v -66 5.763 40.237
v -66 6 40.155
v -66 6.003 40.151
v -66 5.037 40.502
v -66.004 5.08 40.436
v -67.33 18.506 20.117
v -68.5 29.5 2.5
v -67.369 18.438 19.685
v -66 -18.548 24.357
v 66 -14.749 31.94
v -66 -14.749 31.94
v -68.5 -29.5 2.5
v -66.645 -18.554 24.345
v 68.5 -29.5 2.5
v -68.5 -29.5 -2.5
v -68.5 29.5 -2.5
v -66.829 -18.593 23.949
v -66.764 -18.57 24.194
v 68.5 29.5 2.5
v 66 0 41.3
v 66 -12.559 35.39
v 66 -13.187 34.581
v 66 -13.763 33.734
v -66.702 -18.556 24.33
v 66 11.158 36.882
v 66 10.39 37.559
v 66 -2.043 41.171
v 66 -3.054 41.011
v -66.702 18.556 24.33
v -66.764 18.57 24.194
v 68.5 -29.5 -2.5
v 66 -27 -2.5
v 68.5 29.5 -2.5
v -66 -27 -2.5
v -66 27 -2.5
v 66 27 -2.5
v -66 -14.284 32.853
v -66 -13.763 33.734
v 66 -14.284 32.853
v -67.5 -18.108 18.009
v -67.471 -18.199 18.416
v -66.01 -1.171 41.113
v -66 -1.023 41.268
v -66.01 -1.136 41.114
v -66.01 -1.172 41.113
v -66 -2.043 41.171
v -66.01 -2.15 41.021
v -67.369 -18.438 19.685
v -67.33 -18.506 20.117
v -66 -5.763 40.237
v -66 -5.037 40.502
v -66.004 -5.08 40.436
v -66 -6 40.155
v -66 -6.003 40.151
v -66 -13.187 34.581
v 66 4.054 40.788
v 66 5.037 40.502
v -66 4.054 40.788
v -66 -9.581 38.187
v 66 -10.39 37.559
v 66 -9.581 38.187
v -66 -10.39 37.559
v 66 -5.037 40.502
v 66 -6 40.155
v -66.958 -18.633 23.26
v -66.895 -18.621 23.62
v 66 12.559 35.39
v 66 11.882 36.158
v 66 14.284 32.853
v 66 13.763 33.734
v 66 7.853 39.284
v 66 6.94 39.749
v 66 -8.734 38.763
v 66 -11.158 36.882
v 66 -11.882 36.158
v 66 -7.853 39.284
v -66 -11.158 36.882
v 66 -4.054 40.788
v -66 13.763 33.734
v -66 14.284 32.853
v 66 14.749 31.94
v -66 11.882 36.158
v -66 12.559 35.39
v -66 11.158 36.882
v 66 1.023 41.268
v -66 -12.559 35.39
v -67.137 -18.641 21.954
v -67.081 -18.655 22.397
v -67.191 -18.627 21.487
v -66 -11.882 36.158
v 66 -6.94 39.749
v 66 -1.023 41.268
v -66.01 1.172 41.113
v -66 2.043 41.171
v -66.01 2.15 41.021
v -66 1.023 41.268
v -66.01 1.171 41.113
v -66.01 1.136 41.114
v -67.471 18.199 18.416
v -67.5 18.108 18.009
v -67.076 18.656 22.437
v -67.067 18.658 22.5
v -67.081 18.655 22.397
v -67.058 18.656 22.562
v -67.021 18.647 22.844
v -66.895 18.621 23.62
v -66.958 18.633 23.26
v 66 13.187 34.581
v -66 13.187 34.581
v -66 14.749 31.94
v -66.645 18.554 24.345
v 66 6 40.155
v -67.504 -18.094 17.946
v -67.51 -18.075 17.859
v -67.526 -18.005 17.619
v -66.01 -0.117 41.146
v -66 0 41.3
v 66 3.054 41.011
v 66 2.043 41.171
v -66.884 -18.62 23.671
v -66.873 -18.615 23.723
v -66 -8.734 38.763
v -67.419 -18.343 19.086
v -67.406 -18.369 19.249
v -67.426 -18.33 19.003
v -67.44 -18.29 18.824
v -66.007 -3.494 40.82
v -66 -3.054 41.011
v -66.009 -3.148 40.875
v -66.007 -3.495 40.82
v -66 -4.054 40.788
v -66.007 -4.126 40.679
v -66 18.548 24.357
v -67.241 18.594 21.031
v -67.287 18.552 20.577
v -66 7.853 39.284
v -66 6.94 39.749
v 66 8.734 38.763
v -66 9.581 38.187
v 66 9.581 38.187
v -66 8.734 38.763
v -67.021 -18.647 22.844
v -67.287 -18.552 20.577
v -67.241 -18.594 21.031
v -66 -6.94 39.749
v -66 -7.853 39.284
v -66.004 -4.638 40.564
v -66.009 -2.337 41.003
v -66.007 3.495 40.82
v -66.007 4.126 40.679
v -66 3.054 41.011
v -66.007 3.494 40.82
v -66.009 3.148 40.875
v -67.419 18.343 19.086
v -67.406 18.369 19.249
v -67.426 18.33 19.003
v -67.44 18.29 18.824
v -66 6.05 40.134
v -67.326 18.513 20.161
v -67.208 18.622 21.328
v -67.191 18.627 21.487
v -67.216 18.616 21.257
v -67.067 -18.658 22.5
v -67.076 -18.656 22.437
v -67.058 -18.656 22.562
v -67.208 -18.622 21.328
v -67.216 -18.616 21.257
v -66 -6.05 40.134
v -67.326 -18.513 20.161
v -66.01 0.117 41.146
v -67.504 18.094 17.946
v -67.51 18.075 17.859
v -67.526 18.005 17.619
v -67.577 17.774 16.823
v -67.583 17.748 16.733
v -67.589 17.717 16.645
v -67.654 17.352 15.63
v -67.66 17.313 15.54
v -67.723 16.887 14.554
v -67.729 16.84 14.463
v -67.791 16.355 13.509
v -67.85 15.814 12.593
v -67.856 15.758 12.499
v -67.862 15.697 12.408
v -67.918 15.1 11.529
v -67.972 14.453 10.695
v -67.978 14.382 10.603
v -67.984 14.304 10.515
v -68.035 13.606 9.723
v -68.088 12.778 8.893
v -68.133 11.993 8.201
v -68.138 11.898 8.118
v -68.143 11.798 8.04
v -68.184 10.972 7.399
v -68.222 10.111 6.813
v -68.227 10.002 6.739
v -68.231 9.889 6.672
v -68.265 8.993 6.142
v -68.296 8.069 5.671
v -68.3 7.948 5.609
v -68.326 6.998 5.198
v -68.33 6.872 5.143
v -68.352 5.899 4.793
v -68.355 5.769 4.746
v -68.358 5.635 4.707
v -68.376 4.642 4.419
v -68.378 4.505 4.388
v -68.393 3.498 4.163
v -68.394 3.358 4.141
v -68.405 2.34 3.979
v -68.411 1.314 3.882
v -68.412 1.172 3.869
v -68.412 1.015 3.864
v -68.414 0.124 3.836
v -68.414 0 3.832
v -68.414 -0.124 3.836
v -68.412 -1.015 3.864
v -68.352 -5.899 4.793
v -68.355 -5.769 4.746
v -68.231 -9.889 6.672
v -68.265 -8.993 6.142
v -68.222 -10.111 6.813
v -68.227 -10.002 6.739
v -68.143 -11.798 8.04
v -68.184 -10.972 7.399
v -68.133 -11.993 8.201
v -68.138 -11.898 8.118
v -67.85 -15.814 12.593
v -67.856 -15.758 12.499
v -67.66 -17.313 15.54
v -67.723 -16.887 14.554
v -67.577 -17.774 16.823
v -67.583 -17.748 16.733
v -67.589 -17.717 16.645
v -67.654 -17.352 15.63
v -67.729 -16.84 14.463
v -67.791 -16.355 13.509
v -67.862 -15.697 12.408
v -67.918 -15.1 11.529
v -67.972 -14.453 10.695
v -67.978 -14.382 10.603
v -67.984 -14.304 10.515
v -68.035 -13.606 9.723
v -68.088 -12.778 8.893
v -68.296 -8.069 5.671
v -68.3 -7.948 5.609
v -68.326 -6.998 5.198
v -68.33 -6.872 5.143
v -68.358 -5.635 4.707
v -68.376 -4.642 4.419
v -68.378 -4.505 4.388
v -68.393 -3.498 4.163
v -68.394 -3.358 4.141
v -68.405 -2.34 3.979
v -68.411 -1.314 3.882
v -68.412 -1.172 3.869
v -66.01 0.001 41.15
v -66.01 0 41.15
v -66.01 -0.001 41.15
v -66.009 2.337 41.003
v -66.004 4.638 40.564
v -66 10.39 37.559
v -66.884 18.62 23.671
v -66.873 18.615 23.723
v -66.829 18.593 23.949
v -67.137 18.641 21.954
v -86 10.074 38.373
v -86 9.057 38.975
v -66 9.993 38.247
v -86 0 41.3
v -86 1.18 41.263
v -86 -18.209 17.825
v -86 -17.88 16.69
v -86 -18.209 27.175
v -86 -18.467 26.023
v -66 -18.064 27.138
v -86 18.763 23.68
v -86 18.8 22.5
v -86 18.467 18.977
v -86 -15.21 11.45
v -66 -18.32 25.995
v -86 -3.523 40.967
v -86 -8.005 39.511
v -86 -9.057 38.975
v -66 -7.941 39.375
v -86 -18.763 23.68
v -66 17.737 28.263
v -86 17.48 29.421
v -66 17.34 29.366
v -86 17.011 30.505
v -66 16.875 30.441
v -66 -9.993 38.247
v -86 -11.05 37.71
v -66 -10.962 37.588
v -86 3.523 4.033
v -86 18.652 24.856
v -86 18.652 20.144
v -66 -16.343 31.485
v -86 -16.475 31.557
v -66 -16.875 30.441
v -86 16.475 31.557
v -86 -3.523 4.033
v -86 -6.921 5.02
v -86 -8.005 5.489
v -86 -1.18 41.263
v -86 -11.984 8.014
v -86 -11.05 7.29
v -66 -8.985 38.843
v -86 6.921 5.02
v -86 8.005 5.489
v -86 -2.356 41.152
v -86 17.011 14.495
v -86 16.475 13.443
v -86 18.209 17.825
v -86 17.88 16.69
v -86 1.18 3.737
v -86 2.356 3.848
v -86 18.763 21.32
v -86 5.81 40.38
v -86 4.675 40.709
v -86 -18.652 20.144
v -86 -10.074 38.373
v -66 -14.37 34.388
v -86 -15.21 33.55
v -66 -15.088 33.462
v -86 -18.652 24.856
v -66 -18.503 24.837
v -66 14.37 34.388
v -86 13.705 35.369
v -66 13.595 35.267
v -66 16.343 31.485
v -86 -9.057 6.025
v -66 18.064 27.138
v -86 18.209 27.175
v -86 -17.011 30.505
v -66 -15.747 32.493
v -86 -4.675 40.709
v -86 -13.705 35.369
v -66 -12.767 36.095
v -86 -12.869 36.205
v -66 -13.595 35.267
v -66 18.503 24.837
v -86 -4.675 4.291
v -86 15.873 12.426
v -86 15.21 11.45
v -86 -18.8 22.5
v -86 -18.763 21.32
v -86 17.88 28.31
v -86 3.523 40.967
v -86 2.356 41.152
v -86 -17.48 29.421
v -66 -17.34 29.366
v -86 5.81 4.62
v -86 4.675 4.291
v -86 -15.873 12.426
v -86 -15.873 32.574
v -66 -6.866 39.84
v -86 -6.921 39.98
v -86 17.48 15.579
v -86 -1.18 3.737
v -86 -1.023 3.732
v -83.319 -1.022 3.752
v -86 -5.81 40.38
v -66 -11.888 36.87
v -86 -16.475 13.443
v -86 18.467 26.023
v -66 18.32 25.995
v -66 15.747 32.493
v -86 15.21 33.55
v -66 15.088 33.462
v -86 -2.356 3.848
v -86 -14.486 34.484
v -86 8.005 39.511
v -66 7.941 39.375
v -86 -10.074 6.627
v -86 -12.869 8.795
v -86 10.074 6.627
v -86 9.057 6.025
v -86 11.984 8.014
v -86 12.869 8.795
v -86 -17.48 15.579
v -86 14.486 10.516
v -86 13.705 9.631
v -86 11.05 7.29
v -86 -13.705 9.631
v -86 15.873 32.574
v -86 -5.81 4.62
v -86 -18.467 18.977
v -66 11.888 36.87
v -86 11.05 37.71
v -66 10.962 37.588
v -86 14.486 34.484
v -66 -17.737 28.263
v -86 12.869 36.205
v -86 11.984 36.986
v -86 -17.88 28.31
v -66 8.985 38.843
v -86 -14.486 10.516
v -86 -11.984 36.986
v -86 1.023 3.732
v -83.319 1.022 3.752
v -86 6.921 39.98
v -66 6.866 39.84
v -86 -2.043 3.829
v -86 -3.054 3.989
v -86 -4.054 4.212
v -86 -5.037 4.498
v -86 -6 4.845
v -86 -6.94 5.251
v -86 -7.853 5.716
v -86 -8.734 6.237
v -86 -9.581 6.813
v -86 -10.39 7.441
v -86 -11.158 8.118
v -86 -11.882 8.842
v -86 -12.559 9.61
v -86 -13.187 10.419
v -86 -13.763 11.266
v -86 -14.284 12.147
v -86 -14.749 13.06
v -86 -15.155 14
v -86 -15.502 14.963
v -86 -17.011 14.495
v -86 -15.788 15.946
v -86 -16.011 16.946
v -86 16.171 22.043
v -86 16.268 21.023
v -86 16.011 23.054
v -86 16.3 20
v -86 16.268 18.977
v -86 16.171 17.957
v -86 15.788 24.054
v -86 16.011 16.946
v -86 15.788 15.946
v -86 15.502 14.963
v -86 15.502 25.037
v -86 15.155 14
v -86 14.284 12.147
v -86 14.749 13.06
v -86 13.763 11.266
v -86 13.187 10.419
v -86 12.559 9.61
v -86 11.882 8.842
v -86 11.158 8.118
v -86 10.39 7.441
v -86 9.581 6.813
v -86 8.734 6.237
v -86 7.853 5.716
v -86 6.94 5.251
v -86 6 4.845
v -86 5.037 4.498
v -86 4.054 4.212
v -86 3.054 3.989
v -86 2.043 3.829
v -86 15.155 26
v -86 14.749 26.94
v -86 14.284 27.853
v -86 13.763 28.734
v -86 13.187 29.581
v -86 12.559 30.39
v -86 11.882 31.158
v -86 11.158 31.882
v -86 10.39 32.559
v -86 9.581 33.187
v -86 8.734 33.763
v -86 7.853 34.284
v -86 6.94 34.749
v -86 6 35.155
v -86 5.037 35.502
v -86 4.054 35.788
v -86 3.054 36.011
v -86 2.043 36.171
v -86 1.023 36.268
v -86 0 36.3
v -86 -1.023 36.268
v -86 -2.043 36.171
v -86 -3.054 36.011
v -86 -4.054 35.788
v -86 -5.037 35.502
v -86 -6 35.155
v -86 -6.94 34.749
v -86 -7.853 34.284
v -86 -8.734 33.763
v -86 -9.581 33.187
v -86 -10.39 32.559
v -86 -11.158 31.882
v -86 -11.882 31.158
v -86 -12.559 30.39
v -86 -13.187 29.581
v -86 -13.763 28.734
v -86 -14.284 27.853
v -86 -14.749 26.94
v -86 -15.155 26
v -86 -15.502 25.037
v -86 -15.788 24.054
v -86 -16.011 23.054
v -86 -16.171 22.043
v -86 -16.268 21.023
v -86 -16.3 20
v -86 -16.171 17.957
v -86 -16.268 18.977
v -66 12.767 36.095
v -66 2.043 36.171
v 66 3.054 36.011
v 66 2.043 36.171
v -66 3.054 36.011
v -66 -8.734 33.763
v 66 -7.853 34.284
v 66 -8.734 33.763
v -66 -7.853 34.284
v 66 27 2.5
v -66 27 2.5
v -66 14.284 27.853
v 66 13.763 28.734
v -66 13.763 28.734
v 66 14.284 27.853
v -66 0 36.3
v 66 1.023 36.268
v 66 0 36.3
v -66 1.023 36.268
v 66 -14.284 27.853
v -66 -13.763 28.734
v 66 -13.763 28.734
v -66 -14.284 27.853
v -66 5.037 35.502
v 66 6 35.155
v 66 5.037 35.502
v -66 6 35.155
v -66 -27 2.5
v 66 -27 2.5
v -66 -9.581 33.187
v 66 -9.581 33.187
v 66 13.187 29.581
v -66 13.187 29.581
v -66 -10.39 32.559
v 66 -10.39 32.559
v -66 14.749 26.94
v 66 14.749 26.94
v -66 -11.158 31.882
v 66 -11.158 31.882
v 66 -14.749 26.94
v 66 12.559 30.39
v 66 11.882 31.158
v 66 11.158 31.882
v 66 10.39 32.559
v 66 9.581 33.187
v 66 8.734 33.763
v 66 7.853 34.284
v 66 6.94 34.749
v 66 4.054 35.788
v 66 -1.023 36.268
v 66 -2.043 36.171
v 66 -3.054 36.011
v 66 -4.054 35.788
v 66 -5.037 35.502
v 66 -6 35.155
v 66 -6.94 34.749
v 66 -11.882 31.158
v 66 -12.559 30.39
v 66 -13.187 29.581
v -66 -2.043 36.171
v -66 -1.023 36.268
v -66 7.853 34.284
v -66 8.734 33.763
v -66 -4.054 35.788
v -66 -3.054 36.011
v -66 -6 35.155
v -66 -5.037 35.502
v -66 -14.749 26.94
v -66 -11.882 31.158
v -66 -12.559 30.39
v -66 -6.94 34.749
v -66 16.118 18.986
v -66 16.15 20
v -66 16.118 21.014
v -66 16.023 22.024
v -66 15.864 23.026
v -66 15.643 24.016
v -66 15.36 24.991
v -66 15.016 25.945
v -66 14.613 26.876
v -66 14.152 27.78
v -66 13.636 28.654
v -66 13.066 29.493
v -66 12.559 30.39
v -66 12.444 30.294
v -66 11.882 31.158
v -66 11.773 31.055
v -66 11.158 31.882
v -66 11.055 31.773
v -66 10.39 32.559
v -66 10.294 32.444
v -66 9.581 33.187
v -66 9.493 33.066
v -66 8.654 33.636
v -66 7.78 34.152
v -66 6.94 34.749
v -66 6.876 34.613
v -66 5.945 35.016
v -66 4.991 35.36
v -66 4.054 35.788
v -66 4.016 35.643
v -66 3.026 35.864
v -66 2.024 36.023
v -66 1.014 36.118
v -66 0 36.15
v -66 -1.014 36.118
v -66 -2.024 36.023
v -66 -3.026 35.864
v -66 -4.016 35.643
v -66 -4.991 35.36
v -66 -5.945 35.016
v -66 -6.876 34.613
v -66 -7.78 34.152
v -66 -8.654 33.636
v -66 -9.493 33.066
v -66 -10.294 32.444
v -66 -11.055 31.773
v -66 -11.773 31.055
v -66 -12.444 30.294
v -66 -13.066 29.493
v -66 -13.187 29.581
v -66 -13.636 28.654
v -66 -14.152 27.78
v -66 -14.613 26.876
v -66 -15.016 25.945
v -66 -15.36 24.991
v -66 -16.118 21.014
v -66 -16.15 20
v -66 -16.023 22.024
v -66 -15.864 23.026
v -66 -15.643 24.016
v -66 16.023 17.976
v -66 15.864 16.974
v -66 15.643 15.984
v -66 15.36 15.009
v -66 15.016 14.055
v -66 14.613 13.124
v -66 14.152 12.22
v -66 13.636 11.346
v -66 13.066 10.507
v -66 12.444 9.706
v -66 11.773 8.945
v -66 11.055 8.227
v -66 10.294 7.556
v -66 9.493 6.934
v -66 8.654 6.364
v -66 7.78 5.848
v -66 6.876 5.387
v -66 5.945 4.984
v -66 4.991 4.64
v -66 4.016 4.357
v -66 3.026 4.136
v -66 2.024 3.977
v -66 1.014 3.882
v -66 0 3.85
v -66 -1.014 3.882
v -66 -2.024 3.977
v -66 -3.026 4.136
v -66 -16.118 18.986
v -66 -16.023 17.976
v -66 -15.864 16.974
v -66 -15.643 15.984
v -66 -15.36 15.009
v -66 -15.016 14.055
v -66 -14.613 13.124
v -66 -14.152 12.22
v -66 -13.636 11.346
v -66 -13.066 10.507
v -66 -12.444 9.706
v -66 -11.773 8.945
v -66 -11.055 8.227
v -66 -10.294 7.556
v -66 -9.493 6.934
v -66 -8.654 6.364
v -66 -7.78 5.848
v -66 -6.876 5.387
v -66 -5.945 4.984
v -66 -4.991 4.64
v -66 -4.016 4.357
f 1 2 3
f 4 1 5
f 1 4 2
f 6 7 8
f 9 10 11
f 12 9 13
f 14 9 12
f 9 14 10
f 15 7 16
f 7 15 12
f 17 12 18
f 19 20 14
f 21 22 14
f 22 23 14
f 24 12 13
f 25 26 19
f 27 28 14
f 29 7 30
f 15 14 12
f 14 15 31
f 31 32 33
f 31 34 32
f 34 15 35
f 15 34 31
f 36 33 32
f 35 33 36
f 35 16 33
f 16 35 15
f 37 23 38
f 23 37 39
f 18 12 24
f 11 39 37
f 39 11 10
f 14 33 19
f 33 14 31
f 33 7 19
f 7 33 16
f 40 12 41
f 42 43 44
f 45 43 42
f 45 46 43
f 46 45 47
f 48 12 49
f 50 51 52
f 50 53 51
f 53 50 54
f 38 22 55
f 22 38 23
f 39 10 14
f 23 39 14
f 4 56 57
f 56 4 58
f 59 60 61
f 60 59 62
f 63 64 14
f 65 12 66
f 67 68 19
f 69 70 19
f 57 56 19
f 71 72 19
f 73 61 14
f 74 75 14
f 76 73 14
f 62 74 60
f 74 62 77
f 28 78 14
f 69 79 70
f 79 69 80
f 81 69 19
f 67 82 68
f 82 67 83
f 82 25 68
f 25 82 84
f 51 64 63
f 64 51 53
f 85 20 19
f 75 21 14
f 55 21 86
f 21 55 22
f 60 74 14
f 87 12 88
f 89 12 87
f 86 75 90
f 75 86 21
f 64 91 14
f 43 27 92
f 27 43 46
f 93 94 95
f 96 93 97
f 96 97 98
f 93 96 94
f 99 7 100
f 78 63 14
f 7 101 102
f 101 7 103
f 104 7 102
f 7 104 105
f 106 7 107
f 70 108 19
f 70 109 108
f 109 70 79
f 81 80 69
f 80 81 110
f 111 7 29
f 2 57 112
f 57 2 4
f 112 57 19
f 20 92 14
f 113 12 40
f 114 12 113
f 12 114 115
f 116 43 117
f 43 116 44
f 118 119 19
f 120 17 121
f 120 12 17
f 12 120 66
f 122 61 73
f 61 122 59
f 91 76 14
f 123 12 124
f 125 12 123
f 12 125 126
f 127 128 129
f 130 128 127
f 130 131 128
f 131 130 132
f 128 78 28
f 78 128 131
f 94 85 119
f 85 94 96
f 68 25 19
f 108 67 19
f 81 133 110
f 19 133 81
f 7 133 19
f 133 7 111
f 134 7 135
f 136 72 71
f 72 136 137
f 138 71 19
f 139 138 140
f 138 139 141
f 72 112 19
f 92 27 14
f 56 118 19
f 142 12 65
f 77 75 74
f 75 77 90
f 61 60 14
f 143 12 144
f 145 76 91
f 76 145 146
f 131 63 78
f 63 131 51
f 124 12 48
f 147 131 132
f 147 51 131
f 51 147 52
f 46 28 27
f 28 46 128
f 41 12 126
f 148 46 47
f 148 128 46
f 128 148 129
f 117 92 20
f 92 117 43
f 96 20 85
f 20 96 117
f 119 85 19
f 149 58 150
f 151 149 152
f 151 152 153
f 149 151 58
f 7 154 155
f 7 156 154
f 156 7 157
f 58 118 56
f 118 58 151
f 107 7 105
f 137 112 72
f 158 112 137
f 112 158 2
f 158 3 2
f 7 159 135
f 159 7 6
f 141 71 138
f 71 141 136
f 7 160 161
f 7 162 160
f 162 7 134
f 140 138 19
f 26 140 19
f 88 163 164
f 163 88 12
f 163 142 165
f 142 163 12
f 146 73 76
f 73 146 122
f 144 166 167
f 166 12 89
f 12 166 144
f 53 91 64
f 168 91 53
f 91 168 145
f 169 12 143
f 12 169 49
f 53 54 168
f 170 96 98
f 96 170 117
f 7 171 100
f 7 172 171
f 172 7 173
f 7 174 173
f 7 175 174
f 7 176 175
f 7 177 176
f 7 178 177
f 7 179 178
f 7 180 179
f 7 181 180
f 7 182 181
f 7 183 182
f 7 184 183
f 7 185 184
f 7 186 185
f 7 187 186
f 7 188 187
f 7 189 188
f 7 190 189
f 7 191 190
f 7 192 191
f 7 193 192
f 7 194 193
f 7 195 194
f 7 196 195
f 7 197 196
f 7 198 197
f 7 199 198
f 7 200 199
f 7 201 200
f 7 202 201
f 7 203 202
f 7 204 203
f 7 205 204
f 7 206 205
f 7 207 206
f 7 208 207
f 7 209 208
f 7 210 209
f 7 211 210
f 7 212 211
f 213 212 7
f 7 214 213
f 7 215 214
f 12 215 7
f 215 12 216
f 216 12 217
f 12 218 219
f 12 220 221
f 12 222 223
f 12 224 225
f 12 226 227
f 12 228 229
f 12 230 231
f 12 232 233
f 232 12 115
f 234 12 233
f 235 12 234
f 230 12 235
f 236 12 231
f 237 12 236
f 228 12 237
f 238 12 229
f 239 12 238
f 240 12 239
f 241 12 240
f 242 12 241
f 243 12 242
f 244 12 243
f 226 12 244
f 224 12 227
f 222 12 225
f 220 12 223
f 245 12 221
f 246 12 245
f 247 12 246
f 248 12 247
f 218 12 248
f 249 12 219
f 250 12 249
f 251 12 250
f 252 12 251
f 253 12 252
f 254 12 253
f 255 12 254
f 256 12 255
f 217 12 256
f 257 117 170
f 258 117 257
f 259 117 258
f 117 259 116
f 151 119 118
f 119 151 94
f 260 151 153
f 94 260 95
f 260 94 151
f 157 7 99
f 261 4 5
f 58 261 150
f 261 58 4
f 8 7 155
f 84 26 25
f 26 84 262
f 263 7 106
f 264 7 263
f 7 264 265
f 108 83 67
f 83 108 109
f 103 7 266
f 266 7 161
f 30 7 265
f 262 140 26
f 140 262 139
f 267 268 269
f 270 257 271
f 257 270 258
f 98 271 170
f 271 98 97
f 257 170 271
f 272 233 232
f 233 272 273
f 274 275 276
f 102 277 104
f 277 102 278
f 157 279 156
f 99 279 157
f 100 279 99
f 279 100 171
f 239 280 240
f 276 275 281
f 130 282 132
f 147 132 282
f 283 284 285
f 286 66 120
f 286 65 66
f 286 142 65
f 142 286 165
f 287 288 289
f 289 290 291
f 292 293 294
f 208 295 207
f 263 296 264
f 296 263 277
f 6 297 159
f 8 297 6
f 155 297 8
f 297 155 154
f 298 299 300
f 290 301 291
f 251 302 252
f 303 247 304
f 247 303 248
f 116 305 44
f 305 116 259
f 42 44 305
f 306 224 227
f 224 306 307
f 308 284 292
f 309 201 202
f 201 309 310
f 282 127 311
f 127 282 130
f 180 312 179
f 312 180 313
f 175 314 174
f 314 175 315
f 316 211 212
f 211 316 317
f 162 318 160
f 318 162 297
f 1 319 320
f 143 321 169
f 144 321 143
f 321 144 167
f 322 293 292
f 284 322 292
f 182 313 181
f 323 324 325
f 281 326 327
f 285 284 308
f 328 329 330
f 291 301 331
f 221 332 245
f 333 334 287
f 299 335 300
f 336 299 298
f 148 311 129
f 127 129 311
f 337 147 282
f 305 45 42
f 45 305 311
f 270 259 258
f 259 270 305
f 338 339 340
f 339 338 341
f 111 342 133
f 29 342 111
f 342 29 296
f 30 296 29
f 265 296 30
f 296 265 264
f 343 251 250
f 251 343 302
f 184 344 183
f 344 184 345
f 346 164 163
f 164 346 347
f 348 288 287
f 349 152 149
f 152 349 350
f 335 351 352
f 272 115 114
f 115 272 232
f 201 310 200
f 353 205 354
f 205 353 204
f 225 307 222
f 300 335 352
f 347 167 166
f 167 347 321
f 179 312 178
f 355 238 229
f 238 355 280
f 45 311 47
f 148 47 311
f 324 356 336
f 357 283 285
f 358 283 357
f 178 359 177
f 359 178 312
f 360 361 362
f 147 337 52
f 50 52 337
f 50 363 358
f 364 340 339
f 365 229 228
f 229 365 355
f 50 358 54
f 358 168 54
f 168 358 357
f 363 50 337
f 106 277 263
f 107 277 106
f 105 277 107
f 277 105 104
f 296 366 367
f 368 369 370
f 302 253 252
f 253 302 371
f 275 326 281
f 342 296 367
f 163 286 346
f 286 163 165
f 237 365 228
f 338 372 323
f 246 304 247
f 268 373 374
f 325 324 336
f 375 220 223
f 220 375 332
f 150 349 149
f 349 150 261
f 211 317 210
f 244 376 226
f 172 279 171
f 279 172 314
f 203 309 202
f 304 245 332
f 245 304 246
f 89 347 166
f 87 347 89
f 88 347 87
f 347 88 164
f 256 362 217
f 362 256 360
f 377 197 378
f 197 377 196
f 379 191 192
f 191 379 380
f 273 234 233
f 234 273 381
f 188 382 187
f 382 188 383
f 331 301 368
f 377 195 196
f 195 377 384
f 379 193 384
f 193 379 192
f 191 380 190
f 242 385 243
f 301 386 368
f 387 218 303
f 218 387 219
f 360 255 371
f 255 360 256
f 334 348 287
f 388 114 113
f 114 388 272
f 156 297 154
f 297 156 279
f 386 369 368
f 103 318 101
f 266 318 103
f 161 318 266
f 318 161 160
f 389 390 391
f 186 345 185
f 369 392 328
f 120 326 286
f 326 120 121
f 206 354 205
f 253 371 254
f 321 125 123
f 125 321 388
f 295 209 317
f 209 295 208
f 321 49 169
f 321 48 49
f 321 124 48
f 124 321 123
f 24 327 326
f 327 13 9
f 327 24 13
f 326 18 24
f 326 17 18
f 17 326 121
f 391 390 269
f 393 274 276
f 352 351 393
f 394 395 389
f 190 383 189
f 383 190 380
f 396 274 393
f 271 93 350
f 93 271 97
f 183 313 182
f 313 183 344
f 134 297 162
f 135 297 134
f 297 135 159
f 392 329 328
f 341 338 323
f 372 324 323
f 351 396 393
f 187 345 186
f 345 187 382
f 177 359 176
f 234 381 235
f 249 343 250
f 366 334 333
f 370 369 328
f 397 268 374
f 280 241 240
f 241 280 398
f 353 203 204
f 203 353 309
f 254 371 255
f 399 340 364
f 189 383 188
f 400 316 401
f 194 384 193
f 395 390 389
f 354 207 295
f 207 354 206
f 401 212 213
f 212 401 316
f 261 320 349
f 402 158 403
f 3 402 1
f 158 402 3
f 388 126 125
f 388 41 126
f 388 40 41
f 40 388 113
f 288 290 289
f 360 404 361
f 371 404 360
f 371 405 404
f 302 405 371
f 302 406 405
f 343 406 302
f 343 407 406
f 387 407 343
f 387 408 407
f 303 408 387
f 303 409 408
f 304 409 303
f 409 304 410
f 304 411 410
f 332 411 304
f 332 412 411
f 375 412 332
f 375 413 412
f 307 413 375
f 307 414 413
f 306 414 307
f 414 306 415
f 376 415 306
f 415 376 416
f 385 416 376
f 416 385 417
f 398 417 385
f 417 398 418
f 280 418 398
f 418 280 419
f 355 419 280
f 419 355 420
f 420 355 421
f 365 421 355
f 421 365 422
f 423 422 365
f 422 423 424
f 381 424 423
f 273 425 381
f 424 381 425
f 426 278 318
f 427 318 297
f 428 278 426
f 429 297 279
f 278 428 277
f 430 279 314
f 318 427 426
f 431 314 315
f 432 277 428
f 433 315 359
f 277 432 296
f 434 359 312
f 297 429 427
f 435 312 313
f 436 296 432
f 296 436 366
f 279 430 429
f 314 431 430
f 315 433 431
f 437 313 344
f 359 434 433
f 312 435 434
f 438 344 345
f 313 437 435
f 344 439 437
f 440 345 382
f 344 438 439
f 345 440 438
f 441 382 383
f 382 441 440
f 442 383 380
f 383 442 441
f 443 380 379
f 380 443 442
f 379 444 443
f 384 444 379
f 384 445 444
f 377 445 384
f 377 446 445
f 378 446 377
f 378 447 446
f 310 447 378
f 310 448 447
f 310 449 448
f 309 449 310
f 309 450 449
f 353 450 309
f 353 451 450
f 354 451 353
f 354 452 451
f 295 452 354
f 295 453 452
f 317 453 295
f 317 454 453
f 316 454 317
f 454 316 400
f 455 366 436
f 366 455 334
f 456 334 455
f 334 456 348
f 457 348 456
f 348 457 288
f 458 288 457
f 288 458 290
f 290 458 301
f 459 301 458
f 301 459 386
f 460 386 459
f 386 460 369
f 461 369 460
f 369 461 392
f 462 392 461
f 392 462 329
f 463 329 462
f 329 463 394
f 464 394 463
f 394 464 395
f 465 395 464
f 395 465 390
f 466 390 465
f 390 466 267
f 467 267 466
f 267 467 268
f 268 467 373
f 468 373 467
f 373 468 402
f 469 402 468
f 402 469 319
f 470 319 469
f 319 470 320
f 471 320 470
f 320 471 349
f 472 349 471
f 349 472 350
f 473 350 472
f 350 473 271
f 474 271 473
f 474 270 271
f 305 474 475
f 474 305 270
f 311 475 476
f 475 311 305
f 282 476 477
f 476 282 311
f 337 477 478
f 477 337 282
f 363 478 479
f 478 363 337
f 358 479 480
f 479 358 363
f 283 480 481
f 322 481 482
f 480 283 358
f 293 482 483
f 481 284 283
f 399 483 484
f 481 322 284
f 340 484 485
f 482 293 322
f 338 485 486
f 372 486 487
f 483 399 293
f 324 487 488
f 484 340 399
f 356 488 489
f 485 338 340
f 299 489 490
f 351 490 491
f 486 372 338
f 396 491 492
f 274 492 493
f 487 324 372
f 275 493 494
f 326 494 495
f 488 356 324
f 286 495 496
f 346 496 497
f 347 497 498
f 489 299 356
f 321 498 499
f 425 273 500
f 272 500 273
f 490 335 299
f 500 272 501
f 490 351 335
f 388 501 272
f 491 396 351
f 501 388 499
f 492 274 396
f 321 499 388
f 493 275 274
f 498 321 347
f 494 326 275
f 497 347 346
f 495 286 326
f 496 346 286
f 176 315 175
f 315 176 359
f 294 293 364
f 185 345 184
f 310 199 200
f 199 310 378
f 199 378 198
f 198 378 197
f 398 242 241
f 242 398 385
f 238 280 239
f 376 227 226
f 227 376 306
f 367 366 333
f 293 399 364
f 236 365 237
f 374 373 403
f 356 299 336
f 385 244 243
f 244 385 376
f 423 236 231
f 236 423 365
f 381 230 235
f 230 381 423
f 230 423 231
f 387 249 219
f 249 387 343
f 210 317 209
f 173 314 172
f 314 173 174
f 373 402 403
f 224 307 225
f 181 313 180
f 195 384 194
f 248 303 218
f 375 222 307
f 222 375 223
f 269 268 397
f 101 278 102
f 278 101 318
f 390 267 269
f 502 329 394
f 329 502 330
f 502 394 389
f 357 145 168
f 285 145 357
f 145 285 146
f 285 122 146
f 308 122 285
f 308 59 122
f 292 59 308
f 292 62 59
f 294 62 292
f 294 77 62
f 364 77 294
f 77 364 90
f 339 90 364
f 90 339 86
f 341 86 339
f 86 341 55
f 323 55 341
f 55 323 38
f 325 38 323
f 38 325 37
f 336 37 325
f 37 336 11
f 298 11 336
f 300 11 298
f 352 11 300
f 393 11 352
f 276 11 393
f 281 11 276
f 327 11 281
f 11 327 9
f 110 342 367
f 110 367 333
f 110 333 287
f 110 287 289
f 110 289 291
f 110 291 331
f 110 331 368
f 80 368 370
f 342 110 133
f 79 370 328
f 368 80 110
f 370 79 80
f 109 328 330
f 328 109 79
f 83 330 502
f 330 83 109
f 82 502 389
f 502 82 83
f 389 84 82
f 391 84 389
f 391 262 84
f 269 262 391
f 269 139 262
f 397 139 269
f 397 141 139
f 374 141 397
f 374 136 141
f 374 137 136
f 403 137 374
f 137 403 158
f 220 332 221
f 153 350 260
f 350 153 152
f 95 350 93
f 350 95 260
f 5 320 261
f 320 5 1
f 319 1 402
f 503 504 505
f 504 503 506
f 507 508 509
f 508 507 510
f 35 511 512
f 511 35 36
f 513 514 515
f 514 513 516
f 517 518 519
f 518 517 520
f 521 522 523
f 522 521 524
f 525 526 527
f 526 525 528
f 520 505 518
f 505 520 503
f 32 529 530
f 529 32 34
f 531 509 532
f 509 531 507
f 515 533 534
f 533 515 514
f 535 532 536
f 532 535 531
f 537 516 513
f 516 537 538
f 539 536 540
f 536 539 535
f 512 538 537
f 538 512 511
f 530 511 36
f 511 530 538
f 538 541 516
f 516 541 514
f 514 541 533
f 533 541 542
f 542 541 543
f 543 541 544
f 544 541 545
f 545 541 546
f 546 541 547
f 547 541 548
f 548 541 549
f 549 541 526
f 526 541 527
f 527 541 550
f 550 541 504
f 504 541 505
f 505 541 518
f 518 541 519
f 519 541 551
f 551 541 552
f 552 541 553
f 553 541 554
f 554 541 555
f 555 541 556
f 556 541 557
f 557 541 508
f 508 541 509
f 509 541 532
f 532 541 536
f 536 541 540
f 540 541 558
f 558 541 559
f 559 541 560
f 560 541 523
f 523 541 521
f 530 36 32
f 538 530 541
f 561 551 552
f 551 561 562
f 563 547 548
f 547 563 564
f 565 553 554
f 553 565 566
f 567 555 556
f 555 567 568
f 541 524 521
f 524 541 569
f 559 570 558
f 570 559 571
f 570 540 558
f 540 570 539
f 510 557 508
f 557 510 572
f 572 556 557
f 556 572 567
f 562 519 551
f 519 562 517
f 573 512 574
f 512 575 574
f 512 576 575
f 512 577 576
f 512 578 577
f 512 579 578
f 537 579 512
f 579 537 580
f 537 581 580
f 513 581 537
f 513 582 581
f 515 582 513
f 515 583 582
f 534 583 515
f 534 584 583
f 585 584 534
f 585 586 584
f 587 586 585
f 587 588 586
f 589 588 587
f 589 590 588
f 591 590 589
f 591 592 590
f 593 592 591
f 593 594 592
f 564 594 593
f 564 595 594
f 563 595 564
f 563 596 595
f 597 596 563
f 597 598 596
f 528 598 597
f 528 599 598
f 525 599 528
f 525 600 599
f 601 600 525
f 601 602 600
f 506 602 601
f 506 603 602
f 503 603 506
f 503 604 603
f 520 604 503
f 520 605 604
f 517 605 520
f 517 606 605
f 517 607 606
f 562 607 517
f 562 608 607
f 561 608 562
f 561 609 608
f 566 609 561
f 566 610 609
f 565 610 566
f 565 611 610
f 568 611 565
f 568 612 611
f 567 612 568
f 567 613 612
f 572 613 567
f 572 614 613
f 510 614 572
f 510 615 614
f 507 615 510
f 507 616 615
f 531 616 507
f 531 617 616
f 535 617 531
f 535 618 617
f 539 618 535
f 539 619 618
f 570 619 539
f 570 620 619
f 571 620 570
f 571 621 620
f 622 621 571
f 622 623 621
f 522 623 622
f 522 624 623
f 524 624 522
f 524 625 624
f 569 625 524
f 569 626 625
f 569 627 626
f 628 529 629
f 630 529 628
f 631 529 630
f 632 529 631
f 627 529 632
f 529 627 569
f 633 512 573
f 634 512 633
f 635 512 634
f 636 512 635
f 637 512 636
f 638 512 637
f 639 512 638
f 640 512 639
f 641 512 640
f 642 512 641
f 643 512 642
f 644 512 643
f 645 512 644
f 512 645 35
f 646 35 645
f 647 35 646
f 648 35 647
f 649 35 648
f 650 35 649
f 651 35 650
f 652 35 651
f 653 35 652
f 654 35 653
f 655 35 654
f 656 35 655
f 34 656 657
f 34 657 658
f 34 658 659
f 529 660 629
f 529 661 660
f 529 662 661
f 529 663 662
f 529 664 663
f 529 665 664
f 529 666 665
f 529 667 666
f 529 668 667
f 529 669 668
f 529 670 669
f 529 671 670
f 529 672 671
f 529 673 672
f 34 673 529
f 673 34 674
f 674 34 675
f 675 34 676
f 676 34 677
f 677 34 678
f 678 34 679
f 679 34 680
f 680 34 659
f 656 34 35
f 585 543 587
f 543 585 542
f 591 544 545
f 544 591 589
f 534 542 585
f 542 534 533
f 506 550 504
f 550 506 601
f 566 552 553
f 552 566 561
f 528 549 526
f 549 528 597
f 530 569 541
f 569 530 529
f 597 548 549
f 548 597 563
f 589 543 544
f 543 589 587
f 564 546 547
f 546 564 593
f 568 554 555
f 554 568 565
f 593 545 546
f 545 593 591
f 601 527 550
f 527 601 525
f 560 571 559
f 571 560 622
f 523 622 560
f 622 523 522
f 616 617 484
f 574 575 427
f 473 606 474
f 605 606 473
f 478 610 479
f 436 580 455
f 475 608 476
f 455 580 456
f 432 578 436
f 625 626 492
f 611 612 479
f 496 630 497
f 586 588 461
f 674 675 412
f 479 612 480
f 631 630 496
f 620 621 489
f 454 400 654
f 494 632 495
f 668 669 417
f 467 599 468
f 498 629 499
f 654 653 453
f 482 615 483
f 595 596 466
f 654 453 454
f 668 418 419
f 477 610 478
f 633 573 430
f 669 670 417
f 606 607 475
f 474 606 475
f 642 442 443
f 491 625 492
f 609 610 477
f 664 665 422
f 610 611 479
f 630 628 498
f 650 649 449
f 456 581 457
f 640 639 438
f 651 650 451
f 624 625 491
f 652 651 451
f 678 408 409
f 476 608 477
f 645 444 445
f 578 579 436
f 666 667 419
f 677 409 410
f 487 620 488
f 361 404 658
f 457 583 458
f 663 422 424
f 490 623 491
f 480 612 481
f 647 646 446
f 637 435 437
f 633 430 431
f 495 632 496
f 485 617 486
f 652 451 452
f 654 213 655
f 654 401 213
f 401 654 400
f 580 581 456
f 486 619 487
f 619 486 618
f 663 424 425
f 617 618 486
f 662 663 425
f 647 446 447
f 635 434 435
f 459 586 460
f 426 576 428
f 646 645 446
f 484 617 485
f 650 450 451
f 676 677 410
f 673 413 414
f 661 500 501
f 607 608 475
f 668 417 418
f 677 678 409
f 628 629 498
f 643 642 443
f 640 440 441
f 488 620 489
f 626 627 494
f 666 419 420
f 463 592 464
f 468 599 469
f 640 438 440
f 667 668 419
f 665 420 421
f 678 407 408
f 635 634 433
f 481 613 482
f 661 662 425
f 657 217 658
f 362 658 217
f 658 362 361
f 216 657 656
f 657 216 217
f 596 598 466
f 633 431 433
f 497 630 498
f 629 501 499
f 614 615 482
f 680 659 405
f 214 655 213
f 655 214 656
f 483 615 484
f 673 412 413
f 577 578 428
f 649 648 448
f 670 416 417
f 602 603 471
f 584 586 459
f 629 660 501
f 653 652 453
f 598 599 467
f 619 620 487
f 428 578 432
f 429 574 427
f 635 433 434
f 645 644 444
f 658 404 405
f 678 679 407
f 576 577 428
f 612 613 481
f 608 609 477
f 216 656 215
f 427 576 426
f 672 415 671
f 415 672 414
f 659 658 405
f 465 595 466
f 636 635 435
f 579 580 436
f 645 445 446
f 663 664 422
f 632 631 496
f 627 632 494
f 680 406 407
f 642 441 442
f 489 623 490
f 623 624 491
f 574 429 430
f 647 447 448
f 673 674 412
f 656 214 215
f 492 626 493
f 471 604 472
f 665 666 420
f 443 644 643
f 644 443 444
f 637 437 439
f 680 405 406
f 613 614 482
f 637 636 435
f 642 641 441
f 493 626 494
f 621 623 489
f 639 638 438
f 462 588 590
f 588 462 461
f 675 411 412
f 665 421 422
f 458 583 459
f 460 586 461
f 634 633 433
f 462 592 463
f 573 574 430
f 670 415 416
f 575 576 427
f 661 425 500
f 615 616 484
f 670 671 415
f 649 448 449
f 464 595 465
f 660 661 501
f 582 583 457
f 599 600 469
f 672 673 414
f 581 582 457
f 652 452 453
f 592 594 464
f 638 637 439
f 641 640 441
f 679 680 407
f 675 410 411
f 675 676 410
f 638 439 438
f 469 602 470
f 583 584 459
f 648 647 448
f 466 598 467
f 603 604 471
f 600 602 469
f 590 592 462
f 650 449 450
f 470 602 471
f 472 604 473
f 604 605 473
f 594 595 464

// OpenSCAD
$fn=100;

d1 = 32.3;
d2 = 32.6; 
h1 = 20;

x1 = 132;
y1 = 54;



//module b1() {
//hull() {
//    cube([x1,y1,5], center =true);
//    translate([0,0,20])
//    cylinder(d=d1, h=1);
//}
//
//translate([0,0,20])
//cylinder(d=d1, h=10);
//
//}


module b2(offs=0) {

    hull() {
        cube([x1+offs,y1+offs,5], center =true);
        translate([0,0,h1 + offs])
        rotate([0,90,0])
        cylinder(d=d2, h=x1, center=true);
        }

    translate([-x1/2,0,h1+offs/2])
     rotate([0,-90,0])
   cylinder(d1=d1 + offs, d2=d2 + offs, h=h1);

}


//scale([1.002, 1.002, 1]) // 0.2% shrinkage
difference() {
b2(offs=5);
b2(offs=0);
}
